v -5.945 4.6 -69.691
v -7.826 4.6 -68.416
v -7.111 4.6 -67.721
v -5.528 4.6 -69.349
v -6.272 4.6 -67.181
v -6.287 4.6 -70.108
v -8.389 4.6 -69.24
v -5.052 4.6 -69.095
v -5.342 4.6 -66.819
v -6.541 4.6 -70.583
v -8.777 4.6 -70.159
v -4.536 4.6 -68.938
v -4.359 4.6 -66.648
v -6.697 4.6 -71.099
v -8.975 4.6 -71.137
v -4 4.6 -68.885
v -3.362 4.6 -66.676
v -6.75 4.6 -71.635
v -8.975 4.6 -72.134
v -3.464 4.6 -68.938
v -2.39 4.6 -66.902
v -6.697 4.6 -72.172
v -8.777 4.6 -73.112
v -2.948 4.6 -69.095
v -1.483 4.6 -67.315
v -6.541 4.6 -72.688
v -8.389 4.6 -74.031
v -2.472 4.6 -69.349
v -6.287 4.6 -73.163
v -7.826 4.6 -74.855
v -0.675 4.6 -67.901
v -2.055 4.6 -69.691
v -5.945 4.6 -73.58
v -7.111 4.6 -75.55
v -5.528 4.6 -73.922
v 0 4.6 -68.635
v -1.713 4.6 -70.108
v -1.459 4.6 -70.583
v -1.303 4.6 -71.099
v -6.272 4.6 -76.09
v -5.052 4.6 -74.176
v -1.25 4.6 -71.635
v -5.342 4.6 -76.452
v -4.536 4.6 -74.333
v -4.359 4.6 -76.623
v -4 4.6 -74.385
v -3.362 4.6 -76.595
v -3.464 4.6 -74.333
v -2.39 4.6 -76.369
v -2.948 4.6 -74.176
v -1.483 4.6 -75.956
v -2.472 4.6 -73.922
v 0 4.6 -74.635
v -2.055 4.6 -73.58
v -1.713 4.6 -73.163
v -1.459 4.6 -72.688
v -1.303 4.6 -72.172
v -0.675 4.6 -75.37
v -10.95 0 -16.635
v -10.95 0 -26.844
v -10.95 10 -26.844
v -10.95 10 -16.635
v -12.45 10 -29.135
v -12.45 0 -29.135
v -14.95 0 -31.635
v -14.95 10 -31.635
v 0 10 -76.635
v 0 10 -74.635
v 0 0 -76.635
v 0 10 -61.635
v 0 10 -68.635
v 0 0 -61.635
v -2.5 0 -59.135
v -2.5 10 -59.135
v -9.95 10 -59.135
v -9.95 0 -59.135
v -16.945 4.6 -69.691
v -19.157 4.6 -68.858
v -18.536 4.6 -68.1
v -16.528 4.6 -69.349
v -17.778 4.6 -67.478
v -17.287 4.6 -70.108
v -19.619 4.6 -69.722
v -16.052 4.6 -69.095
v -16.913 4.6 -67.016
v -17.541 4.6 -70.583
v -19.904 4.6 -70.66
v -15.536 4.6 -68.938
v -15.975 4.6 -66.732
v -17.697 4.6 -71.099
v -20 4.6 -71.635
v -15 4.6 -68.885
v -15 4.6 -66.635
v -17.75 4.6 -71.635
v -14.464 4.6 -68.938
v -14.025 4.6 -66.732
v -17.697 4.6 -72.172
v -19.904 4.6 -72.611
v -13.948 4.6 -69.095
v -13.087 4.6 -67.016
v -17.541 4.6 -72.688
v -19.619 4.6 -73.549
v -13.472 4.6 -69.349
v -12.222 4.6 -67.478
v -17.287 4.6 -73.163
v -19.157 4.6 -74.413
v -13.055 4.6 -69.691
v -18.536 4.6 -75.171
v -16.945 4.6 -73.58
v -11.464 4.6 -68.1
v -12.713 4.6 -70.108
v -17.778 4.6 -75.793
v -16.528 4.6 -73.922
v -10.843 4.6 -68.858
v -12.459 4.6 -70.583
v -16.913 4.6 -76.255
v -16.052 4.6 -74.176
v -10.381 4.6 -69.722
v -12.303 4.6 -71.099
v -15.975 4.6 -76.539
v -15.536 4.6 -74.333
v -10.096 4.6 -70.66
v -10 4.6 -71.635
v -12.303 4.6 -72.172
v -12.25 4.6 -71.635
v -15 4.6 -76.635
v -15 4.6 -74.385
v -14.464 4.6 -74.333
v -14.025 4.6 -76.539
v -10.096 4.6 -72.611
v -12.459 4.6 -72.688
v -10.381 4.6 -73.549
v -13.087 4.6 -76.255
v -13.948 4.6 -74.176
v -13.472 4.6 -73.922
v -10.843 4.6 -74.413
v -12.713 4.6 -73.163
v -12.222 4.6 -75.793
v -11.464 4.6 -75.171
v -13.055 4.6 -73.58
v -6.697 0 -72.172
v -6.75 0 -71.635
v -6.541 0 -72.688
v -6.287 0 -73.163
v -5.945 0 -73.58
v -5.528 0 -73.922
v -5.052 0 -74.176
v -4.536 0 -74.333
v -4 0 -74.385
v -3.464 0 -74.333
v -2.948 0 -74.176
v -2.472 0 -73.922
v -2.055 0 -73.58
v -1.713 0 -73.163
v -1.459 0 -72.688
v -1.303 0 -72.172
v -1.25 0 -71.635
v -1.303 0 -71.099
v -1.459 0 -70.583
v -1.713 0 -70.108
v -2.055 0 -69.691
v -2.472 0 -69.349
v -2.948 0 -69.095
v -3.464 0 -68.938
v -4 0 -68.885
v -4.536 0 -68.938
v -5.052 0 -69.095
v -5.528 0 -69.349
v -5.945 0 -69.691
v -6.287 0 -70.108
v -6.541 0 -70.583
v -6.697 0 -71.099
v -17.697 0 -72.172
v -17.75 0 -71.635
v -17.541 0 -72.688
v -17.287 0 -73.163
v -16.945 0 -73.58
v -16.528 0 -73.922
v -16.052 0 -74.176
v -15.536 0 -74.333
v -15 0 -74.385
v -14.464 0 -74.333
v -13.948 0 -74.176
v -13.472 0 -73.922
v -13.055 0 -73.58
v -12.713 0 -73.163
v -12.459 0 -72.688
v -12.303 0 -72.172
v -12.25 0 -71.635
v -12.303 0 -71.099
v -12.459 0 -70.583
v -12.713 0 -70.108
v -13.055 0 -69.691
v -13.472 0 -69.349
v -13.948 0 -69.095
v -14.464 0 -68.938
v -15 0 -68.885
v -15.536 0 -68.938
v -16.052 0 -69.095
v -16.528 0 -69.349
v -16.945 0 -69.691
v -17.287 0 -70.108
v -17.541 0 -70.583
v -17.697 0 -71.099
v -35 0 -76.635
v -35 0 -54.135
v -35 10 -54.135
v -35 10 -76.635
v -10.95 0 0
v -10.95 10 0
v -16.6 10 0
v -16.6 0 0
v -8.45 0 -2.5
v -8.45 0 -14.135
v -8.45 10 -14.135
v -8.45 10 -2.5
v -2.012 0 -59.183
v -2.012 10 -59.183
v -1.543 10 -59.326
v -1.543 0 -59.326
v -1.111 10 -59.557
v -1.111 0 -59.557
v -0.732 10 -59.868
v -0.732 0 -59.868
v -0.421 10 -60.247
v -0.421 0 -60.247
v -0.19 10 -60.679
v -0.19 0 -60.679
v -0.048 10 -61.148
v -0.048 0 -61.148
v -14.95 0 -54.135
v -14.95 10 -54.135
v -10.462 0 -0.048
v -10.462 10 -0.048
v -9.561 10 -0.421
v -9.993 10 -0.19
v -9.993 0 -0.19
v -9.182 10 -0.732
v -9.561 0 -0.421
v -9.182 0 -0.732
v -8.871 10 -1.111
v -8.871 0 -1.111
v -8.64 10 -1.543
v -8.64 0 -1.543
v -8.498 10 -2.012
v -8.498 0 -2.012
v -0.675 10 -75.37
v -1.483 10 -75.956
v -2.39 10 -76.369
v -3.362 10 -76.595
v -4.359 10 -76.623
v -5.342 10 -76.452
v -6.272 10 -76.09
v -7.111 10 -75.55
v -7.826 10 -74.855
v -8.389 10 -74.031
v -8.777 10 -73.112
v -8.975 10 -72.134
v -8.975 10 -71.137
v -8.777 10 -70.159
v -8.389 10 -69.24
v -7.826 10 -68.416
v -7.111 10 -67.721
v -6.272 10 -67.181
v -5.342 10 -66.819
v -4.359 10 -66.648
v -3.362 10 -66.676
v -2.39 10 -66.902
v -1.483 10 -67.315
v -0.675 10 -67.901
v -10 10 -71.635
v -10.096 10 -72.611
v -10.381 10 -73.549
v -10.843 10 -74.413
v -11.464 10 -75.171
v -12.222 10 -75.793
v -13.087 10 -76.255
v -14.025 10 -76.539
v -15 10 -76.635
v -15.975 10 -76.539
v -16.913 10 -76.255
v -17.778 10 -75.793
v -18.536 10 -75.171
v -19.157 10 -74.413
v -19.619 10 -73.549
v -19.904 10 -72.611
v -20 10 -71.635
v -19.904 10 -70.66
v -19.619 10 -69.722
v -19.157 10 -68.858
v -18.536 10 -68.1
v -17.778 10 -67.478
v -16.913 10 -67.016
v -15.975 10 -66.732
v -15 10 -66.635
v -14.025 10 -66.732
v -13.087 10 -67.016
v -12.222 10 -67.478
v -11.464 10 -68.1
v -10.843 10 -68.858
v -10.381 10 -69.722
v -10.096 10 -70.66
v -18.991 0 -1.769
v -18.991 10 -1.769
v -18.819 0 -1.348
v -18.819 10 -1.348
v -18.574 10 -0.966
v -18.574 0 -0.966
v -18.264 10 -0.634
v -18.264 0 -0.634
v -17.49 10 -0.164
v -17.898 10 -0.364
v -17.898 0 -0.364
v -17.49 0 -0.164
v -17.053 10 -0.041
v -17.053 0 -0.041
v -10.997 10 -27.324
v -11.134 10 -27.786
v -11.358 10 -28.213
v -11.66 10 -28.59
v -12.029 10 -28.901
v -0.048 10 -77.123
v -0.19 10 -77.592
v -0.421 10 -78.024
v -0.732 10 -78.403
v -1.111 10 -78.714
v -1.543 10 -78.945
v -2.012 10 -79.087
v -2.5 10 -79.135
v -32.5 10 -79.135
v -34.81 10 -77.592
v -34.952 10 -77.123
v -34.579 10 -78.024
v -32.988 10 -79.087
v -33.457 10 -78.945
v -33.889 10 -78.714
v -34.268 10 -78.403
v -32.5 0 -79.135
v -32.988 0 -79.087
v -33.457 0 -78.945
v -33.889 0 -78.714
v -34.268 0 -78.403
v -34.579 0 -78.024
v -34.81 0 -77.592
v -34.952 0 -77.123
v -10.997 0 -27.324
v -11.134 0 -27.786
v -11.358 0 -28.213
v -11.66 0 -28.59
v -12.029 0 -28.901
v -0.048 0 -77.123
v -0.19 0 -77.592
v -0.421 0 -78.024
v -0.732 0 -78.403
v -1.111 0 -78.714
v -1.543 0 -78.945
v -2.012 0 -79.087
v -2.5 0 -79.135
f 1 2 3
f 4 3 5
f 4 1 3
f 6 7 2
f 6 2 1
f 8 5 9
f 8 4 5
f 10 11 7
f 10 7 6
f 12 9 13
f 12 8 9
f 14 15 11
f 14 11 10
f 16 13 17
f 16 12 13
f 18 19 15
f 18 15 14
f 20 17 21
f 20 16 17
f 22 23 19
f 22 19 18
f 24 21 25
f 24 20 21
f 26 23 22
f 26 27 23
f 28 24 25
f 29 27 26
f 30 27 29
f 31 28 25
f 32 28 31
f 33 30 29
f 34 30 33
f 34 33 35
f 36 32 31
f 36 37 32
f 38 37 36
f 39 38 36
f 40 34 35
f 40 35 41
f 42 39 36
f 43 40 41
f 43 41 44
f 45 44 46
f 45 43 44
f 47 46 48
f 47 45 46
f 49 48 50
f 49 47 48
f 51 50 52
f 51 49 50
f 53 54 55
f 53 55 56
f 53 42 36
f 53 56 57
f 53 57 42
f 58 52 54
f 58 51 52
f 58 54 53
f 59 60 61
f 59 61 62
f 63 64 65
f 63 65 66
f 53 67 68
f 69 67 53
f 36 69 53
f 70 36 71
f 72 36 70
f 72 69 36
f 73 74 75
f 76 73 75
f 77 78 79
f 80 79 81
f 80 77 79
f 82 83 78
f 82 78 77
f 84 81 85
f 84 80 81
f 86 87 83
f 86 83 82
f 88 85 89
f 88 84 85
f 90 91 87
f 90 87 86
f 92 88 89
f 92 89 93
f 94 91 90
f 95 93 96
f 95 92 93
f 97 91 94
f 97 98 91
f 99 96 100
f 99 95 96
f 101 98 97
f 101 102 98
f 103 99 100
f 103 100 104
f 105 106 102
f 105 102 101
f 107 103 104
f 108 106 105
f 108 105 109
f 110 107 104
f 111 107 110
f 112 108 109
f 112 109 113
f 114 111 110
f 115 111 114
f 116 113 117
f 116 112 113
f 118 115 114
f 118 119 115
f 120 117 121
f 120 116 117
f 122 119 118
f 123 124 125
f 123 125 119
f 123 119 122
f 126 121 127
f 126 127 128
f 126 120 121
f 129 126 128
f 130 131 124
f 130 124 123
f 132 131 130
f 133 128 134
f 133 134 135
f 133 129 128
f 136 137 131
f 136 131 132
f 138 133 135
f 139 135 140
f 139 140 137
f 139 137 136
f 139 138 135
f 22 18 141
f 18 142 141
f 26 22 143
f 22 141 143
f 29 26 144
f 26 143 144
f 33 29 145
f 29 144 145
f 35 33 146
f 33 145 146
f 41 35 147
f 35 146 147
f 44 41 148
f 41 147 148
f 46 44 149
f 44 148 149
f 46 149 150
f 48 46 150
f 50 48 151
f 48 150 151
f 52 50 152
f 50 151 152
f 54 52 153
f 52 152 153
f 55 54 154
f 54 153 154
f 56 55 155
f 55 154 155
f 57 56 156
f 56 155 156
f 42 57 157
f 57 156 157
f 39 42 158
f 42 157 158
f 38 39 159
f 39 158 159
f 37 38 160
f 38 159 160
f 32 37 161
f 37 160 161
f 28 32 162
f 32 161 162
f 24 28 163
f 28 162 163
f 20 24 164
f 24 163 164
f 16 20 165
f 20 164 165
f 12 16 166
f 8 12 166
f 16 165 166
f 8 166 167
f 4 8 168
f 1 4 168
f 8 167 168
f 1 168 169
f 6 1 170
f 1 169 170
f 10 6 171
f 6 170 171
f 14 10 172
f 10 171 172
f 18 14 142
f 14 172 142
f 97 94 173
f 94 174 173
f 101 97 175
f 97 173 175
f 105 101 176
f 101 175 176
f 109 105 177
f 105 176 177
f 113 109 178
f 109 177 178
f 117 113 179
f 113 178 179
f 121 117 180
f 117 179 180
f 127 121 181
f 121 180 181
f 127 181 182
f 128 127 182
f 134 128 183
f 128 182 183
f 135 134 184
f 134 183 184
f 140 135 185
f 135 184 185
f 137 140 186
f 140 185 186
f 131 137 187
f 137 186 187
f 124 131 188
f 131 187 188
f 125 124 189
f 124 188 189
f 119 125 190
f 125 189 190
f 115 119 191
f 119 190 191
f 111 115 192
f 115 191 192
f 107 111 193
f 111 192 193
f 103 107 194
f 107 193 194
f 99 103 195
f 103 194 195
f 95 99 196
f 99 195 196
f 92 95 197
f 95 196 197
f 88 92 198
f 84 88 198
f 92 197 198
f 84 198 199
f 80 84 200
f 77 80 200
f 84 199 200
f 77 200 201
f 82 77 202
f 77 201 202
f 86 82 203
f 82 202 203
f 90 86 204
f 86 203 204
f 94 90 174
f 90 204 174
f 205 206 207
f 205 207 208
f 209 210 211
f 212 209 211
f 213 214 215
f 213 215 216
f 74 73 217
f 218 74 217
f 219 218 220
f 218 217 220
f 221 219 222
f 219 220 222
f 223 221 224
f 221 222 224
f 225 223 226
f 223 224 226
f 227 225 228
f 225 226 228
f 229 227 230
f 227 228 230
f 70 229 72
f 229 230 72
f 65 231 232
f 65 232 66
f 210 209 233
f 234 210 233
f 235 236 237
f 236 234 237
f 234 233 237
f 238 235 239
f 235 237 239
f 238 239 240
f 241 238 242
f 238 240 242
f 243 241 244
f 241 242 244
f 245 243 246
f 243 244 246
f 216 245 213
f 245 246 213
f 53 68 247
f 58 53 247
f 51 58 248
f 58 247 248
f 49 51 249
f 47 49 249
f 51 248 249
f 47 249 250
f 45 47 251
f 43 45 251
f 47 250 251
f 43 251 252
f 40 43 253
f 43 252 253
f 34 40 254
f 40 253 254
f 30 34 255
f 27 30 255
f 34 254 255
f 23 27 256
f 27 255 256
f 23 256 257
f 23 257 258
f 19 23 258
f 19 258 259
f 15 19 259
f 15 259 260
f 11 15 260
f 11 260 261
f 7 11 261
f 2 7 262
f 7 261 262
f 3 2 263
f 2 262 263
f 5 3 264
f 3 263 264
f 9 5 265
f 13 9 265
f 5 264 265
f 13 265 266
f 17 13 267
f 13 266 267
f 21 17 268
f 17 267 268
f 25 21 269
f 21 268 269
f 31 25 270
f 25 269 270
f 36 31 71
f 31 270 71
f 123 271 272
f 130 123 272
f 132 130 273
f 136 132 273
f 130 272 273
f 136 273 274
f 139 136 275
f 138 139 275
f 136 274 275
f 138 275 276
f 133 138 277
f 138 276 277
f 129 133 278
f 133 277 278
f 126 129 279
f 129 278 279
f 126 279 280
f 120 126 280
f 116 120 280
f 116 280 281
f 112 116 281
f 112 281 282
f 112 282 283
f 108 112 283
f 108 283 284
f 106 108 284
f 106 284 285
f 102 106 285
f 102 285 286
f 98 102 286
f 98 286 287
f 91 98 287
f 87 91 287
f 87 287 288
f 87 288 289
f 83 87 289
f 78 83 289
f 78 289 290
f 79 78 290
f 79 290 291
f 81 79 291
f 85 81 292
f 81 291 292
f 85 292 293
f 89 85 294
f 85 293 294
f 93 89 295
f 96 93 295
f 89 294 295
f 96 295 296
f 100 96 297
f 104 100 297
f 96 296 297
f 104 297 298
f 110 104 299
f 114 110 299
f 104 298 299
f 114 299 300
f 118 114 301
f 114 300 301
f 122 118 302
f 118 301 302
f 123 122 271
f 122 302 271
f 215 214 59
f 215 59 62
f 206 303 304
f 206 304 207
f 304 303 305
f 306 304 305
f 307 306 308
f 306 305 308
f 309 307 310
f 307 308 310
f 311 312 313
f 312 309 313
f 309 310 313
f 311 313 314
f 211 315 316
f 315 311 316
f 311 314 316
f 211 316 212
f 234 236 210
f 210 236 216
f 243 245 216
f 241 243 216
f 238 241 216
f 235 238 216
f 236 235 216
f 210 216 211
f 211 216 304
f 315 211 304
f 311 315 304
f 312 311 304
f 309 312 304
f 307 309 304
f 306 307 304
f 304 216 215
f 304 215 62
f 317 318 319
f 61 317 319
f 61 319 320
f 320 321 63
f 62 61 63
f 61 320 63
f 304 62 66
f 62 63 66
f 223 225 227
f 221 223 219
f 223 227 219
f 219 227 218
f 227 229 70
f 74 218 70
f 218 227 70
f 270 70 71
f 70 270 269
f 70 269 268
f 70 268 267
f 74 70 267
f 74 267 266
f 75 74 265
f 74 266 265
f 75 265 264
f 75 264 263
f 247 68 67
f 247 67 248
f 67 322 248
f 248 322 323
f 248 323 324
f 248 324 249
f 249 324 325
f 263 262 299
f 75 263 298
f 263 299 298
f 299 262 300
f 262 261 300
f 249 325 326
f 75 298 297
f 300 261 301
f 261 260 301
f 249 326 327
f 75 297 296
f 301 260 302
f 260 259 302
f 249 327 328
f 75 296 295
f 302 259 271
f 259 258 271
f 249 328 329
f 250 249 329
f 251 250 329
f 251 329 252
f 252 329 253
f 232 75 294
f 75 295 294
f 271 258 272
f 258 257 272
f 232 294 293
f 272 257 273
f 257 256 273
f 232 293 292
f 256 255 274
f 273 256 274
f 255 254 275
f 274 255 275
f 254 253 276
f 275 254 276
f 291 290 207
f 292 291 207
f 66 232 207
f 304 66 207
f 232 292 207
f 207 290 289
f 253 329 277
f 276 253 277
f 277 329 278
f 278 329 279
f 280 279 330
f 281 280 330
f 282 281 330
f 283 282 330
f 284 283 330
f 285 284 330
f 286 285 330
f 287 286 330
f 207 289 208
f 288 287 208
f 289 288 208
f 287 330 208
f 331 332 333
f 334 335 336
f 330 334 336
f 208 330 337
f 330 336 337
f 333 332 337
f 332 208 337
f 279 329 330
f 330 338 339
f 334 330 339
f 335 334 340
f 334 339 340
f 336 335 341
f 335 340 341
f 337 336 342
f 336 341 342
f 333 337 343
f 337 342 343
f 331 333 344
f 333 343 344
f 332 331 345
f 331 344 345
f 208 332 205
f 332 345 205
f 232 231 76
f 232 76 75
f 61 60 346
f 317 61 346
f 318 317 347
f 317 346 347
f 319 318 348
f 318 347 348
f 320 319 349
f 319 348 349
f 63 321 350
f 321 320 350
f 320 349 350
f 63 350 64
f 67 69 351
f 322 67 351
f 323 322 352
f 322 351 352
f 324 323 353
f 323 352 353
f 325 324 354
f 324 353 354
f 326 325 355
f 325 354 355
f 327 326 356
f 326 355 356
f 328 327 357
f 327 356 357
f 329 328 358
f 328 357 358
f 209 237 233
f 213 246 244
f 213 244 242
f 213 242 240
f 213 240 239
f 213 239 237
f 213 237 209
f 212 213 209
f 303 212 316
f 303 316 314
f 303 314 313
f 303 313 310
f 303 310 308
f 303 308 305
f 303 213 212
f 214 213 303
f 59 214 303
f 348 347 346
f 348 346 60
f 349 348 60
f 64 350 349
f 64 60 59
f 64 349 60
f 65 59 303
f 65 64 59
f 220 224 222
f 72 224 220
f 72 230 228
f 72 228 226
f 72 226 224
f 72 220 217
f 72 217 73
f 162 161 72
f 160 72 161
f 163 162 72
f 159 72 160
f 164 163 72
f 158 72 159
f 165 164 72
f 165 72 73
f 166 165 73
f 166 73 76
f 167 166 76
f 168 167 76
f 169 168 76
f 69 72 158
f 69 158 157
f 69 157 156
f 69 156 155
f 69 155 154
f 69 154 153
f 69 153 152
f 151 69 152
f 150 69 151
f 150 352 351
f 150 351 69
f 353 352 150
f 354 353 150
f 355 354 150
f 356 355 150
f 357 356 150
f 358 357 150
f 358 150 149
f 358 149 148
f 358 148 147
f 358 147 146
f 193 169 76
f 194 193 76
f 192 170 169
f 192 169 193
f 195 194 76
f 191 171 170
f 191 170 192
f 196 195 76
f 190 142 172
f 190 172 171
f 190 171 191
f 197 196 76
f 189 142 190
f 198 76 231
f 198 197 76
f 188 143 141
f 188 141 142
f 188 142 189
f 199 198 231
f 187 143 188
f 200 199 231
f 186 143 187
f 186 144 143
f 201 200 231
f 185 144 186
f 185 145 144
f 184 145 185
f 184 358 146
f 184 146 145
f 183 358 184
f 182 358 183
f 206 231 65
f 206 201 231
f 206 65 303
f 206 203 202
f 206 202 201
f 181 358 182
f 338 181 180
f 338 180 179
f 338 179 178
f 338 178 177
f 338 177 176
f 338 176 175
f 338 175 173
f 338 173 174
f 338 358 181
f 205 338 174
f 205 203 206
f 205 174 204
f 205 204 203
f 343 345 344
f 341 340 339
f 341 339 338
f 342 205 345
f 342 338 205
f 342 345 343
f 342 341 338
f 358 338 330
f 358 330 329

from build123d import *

# Parameters (mm, degrees)
BOSS_EXTRUDE1_DEPTH                                 = 10
CHAMFER1_SIZE                                       = 5
CHAMFER2_SIZE                                       = 2.5
FILLET1_R                                           = 2.5
CBORE_FOR_M5_HEX_SOCKET_HEAD_CAP_SCREW2_D           = 5.5
CBORE_FOR_M5_HEX_SOCKET_HEAD_CAP_SCREW2_DEPTH       = 10
CBORE_FOR_M5_HEX_SOCKET_HEAD_CAP_SCREW2_CBORE_D     = 10
CBORE_FOR_M5_HEX_SOCKET_HEAD_CAP_SCREW2_CBORE_DEPTH = 5.4
CBORE_FOR_M5_HEX_SOCKET_HEAD_CAP_SCREW2_TIP         = 1.652366702


# Some blends are built 0.0001 mm under size
with BuildPart() as part:
    # Sketch2 → Boss-Extrude1 (new body)
    with BuildSketch(Plane(origin=(0, 0, 0), x_dir=(1, 0, 0), z_dir=(0, 1, 0))):
        Polygon((0, 59.135462652), (-14.95, 59.135462652), (-14.95, 29.135462652), (-10.95, 29.135462652), (-10.95, 14.135462652), (-8.45, 14.135462652), (-8.45, 0), (-18.45, 0), (-35, 54.135462652), (-35, 79.135462652), (0, 79.135462652), align=None)
    extrude(amount=BOSS_EXTRUDE1_DEPTH)

    # Chamfer1
    chamfer1_edges = [part.edges().sort_by_distance(p)[0] for p in [
        (-14.95, 5, -59.135462652),
    ]]
    chamfer(chamfer1_edges, length=CHAMFER1_SIZE)

    # Chamfer2
    chamfer2_edges = [part.edges().sort_by_distance(p)[0] for p in [
        (-10.95, 5, -14.135462652),
        (-14.95, 5, -29.135462652),
    ]]
    chamfer(chamfer2_edges, length=CHAMFER2_SIZE - 0.0001)  # a hair under: the kernel refuses the full size

    # Fillet1
    # the kernel refuses this fillet: 2.5 mm, written as the material it takes off along each edge
    with BuildSketch(Plane(origin=(0, -6.25, -79.135462652), x_dir=(0, 0, 1), z_dir=(0, 1, 0)), Plane(origin=(-35, -6.25, -79.135462652), x_dir=(1, 0, 0), z_dir=(0, 1, 0)), Plane(origin=(0, -6.25, -59.135462652), x_dir=(-1, 0, 0), z_dir=(0, 1, 0))) as fillet1_piece_1:
        with BuildLine():
            CenterArc((FILLET1_R, -FILLET1_R), FILLET1_R, 90, 90)
            Line((0, -FILLET1_R), (-FILLET1_R * 0.02, -FILLET1_R))
            Line((-FILLET1_R * 0.02, -FILLET1_R), (-FILLET1_R * 0.02, FILLET1_R * 0.02))
            Line((-FILLET1_R * 0.02, FILLET1_R * 0.02), (FILLET1_R, FILLET1_R * 0.02))
            Line((FILLET1_R, FILLET1_R * 0.02), (FILLET1_R, 0))
        make_face()
    extrude(amount=22.5, mode=Mode.SUBTRACT)
    with BuildSketch(Plane(origin=(-8.45, -6.25, 0), x_dir=(0, 0, -1), z_dir=(0, 1, 0))) as fillet1_piece_2:
        with BuildLine():
            CenterArc((FILLET1_R, FILLET1_R), FILLET1_R, 180, 90)
            Line((0, FILLET1_R), (-FILLET1_R * 0.02, FILLET1_R))
            Line((-FILLET1_R * 0.02, FILLET1_R), (-FILLET1_R * 0.02, -FILLET1_R * 0.02))
            Line((-FILLET1_R * 0.02, -FILLET1_R * 0.02), (FILLET1_R, -FILLET1_R * 0.02))
            Line((FILLET1_R, -FILLET1_R * 0.02), (FILLET1_R, 0))
        make_face()
    extrude(amount=22.5, mode=Mode.SUBTRACT)
    with BuildSketch(Plane(origin=(-18.45, -4.62482795, 0), x_dir=(-0.29235761927834925, 0, -0.9563090622021188), z_dir=(0, 1, 0))) as fillet1_piece_3:
        with BuildLine():
            CenterArc((FILLET1_R * 0.739972471966, -FILLET1_R), FILLET1_R, 90, 73.00084391)
            Line((-FILLET1_R * 0.216336590236, -FILLET1_R * 0.707642380722), (-FILLET1_R * 0.23546277148, -FILLET1_R * 0.701795228336))
            Line((-FILLET1_R * 0.23546277148, -FILLET1_R * 0.701795228336), (-FILLET1_R * 0.0147994494393, FILLET1_R * 0.02))
            Line((-FILLET1_R * 0.0147994494393, FILLET1_R * 0.02), (FILLET1_R * 0.739972471966, FILLET1_R * 0.02))
            Line((FILLET1_R * 0.739972471966, FILLET1_R * 0.02), (FILLET1_R * 0.739972471966, 0))
        make_face()
    extrude(amount=19.2496559, mode=Mode.SUBTRACT)
    with BuildSketch(Plane(origin=(-10.95, -5.728328721, -29.135462652), x_dir=(-1, 0, 0), z_dir=(0, 1, 0))) as fillet1_piece_4:
        with BuildLine():
            CenterArc((2.5, 2.291331488), FILLET1_R, 180, 66.424322091)
            Line((0, 2.291331488), (-0.05, 2.291331488))
            Line((-0.05, 2.291331488), (-0.05, 0))
            Line((-0.05, 0), (0, -0.05))
            ThreePointArc((0, -0.05), (0.75005, -0.05), (1.480102, -0.04582663))
            Line((1.480102, -0.04582663), (1.5001, 0))
        make_face()
    extrude(amount=21.456657442, mode=Mode.SUBTRACT)

    # CBORE for M5 Hex Socket Head Cap Screw2
    with Locations(Plane(origin=(0, 10, 0), x_dir=(1, 0, 0), z_dir=(0, 1, 0))):
        with Locations((-15, 71.635462652), (-4, 71.635462652)):
            CounterBoreHole(CBORE_FOR_M5_HEX_SOCKET_HEAD_CAP_SCREW2_D / 2, CBORE_FOR_M5_HEX_SOCKET_HEAD_CAP_SCREW2_CBORE_D / 2, CBORE_FOR_M5_HEX_SOCKET_HEAD_CAP_SCREW2_CBORE_DEPTH, depth=CBORE_FOR_M5_HEX_SOCKET_HEAD_CAP_SCREW2_DEPTH)
            with Locations((0, 0, -(CBORE_FOR_M5_HEX_SOCKET_HEAD_CAP_SCREW2_DEPTH + CBORE_FOR_M5_HEX_SOCKET_HEAD_CAP_SCREW2_TIP / 2))):  # 118° drill point
                Cone(0, CBORE_FOR_M5_HEX_SOCKET_HEAD_CAP_SCREW2_D / 2, CBORE_FOR_M5_HEX_SOCKET_HEAD_CAP_SCREW2_TIP, mode=Mode.SUBTRACT)


solid = part.part
